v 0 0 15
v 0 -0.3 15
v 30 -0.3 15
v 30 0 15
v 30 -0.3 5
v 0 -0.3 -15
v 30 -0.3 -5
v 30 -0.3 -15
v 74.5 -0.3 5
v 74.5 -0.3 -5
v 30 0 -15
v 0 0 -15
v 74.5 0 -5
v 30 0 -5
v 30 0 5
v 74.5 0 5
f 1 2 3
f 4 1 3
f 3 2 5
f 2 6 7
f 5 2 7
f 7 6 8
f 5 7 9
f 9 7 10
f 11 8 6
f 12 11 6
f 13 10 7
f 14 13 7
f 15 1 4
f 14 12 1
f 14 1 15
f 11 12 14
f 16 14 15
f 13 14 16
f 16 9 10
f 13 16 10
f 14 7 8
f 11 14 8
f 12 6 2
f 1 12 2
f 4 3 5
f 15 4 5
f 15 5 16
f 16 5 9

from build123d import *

# Parameters (mm, degrees)
BOSS_EXTRUDE1_DEPTH      = 0.0001
BOSS_EXTRUDE1_DEPTH_BACK = 0.3


with BuildPart() as part:
    # Sketch1 → Boss-Extrude1 (new, two sides: drawn at the far end of the back side and taken through both)
    with BuildSketch(Plane(origin=(0, 0, 0), x_dir=(1, 0, 0), z_dir=(0, 1, 0)).offset(-BOSS_EXTRUDE1_DEPTH_BACK)):
        Polygon((0, -15), (30, -15), (30, -5), (74.5, -5), (74.5, 5), (30, 5), (30, 15), (0, 15), align=None)
    extrude(amount=BOSS_EXTRUDE1_DEPTH + BOSS_EXTRUDE1_DEPTH_BACK)


solid = part.part
